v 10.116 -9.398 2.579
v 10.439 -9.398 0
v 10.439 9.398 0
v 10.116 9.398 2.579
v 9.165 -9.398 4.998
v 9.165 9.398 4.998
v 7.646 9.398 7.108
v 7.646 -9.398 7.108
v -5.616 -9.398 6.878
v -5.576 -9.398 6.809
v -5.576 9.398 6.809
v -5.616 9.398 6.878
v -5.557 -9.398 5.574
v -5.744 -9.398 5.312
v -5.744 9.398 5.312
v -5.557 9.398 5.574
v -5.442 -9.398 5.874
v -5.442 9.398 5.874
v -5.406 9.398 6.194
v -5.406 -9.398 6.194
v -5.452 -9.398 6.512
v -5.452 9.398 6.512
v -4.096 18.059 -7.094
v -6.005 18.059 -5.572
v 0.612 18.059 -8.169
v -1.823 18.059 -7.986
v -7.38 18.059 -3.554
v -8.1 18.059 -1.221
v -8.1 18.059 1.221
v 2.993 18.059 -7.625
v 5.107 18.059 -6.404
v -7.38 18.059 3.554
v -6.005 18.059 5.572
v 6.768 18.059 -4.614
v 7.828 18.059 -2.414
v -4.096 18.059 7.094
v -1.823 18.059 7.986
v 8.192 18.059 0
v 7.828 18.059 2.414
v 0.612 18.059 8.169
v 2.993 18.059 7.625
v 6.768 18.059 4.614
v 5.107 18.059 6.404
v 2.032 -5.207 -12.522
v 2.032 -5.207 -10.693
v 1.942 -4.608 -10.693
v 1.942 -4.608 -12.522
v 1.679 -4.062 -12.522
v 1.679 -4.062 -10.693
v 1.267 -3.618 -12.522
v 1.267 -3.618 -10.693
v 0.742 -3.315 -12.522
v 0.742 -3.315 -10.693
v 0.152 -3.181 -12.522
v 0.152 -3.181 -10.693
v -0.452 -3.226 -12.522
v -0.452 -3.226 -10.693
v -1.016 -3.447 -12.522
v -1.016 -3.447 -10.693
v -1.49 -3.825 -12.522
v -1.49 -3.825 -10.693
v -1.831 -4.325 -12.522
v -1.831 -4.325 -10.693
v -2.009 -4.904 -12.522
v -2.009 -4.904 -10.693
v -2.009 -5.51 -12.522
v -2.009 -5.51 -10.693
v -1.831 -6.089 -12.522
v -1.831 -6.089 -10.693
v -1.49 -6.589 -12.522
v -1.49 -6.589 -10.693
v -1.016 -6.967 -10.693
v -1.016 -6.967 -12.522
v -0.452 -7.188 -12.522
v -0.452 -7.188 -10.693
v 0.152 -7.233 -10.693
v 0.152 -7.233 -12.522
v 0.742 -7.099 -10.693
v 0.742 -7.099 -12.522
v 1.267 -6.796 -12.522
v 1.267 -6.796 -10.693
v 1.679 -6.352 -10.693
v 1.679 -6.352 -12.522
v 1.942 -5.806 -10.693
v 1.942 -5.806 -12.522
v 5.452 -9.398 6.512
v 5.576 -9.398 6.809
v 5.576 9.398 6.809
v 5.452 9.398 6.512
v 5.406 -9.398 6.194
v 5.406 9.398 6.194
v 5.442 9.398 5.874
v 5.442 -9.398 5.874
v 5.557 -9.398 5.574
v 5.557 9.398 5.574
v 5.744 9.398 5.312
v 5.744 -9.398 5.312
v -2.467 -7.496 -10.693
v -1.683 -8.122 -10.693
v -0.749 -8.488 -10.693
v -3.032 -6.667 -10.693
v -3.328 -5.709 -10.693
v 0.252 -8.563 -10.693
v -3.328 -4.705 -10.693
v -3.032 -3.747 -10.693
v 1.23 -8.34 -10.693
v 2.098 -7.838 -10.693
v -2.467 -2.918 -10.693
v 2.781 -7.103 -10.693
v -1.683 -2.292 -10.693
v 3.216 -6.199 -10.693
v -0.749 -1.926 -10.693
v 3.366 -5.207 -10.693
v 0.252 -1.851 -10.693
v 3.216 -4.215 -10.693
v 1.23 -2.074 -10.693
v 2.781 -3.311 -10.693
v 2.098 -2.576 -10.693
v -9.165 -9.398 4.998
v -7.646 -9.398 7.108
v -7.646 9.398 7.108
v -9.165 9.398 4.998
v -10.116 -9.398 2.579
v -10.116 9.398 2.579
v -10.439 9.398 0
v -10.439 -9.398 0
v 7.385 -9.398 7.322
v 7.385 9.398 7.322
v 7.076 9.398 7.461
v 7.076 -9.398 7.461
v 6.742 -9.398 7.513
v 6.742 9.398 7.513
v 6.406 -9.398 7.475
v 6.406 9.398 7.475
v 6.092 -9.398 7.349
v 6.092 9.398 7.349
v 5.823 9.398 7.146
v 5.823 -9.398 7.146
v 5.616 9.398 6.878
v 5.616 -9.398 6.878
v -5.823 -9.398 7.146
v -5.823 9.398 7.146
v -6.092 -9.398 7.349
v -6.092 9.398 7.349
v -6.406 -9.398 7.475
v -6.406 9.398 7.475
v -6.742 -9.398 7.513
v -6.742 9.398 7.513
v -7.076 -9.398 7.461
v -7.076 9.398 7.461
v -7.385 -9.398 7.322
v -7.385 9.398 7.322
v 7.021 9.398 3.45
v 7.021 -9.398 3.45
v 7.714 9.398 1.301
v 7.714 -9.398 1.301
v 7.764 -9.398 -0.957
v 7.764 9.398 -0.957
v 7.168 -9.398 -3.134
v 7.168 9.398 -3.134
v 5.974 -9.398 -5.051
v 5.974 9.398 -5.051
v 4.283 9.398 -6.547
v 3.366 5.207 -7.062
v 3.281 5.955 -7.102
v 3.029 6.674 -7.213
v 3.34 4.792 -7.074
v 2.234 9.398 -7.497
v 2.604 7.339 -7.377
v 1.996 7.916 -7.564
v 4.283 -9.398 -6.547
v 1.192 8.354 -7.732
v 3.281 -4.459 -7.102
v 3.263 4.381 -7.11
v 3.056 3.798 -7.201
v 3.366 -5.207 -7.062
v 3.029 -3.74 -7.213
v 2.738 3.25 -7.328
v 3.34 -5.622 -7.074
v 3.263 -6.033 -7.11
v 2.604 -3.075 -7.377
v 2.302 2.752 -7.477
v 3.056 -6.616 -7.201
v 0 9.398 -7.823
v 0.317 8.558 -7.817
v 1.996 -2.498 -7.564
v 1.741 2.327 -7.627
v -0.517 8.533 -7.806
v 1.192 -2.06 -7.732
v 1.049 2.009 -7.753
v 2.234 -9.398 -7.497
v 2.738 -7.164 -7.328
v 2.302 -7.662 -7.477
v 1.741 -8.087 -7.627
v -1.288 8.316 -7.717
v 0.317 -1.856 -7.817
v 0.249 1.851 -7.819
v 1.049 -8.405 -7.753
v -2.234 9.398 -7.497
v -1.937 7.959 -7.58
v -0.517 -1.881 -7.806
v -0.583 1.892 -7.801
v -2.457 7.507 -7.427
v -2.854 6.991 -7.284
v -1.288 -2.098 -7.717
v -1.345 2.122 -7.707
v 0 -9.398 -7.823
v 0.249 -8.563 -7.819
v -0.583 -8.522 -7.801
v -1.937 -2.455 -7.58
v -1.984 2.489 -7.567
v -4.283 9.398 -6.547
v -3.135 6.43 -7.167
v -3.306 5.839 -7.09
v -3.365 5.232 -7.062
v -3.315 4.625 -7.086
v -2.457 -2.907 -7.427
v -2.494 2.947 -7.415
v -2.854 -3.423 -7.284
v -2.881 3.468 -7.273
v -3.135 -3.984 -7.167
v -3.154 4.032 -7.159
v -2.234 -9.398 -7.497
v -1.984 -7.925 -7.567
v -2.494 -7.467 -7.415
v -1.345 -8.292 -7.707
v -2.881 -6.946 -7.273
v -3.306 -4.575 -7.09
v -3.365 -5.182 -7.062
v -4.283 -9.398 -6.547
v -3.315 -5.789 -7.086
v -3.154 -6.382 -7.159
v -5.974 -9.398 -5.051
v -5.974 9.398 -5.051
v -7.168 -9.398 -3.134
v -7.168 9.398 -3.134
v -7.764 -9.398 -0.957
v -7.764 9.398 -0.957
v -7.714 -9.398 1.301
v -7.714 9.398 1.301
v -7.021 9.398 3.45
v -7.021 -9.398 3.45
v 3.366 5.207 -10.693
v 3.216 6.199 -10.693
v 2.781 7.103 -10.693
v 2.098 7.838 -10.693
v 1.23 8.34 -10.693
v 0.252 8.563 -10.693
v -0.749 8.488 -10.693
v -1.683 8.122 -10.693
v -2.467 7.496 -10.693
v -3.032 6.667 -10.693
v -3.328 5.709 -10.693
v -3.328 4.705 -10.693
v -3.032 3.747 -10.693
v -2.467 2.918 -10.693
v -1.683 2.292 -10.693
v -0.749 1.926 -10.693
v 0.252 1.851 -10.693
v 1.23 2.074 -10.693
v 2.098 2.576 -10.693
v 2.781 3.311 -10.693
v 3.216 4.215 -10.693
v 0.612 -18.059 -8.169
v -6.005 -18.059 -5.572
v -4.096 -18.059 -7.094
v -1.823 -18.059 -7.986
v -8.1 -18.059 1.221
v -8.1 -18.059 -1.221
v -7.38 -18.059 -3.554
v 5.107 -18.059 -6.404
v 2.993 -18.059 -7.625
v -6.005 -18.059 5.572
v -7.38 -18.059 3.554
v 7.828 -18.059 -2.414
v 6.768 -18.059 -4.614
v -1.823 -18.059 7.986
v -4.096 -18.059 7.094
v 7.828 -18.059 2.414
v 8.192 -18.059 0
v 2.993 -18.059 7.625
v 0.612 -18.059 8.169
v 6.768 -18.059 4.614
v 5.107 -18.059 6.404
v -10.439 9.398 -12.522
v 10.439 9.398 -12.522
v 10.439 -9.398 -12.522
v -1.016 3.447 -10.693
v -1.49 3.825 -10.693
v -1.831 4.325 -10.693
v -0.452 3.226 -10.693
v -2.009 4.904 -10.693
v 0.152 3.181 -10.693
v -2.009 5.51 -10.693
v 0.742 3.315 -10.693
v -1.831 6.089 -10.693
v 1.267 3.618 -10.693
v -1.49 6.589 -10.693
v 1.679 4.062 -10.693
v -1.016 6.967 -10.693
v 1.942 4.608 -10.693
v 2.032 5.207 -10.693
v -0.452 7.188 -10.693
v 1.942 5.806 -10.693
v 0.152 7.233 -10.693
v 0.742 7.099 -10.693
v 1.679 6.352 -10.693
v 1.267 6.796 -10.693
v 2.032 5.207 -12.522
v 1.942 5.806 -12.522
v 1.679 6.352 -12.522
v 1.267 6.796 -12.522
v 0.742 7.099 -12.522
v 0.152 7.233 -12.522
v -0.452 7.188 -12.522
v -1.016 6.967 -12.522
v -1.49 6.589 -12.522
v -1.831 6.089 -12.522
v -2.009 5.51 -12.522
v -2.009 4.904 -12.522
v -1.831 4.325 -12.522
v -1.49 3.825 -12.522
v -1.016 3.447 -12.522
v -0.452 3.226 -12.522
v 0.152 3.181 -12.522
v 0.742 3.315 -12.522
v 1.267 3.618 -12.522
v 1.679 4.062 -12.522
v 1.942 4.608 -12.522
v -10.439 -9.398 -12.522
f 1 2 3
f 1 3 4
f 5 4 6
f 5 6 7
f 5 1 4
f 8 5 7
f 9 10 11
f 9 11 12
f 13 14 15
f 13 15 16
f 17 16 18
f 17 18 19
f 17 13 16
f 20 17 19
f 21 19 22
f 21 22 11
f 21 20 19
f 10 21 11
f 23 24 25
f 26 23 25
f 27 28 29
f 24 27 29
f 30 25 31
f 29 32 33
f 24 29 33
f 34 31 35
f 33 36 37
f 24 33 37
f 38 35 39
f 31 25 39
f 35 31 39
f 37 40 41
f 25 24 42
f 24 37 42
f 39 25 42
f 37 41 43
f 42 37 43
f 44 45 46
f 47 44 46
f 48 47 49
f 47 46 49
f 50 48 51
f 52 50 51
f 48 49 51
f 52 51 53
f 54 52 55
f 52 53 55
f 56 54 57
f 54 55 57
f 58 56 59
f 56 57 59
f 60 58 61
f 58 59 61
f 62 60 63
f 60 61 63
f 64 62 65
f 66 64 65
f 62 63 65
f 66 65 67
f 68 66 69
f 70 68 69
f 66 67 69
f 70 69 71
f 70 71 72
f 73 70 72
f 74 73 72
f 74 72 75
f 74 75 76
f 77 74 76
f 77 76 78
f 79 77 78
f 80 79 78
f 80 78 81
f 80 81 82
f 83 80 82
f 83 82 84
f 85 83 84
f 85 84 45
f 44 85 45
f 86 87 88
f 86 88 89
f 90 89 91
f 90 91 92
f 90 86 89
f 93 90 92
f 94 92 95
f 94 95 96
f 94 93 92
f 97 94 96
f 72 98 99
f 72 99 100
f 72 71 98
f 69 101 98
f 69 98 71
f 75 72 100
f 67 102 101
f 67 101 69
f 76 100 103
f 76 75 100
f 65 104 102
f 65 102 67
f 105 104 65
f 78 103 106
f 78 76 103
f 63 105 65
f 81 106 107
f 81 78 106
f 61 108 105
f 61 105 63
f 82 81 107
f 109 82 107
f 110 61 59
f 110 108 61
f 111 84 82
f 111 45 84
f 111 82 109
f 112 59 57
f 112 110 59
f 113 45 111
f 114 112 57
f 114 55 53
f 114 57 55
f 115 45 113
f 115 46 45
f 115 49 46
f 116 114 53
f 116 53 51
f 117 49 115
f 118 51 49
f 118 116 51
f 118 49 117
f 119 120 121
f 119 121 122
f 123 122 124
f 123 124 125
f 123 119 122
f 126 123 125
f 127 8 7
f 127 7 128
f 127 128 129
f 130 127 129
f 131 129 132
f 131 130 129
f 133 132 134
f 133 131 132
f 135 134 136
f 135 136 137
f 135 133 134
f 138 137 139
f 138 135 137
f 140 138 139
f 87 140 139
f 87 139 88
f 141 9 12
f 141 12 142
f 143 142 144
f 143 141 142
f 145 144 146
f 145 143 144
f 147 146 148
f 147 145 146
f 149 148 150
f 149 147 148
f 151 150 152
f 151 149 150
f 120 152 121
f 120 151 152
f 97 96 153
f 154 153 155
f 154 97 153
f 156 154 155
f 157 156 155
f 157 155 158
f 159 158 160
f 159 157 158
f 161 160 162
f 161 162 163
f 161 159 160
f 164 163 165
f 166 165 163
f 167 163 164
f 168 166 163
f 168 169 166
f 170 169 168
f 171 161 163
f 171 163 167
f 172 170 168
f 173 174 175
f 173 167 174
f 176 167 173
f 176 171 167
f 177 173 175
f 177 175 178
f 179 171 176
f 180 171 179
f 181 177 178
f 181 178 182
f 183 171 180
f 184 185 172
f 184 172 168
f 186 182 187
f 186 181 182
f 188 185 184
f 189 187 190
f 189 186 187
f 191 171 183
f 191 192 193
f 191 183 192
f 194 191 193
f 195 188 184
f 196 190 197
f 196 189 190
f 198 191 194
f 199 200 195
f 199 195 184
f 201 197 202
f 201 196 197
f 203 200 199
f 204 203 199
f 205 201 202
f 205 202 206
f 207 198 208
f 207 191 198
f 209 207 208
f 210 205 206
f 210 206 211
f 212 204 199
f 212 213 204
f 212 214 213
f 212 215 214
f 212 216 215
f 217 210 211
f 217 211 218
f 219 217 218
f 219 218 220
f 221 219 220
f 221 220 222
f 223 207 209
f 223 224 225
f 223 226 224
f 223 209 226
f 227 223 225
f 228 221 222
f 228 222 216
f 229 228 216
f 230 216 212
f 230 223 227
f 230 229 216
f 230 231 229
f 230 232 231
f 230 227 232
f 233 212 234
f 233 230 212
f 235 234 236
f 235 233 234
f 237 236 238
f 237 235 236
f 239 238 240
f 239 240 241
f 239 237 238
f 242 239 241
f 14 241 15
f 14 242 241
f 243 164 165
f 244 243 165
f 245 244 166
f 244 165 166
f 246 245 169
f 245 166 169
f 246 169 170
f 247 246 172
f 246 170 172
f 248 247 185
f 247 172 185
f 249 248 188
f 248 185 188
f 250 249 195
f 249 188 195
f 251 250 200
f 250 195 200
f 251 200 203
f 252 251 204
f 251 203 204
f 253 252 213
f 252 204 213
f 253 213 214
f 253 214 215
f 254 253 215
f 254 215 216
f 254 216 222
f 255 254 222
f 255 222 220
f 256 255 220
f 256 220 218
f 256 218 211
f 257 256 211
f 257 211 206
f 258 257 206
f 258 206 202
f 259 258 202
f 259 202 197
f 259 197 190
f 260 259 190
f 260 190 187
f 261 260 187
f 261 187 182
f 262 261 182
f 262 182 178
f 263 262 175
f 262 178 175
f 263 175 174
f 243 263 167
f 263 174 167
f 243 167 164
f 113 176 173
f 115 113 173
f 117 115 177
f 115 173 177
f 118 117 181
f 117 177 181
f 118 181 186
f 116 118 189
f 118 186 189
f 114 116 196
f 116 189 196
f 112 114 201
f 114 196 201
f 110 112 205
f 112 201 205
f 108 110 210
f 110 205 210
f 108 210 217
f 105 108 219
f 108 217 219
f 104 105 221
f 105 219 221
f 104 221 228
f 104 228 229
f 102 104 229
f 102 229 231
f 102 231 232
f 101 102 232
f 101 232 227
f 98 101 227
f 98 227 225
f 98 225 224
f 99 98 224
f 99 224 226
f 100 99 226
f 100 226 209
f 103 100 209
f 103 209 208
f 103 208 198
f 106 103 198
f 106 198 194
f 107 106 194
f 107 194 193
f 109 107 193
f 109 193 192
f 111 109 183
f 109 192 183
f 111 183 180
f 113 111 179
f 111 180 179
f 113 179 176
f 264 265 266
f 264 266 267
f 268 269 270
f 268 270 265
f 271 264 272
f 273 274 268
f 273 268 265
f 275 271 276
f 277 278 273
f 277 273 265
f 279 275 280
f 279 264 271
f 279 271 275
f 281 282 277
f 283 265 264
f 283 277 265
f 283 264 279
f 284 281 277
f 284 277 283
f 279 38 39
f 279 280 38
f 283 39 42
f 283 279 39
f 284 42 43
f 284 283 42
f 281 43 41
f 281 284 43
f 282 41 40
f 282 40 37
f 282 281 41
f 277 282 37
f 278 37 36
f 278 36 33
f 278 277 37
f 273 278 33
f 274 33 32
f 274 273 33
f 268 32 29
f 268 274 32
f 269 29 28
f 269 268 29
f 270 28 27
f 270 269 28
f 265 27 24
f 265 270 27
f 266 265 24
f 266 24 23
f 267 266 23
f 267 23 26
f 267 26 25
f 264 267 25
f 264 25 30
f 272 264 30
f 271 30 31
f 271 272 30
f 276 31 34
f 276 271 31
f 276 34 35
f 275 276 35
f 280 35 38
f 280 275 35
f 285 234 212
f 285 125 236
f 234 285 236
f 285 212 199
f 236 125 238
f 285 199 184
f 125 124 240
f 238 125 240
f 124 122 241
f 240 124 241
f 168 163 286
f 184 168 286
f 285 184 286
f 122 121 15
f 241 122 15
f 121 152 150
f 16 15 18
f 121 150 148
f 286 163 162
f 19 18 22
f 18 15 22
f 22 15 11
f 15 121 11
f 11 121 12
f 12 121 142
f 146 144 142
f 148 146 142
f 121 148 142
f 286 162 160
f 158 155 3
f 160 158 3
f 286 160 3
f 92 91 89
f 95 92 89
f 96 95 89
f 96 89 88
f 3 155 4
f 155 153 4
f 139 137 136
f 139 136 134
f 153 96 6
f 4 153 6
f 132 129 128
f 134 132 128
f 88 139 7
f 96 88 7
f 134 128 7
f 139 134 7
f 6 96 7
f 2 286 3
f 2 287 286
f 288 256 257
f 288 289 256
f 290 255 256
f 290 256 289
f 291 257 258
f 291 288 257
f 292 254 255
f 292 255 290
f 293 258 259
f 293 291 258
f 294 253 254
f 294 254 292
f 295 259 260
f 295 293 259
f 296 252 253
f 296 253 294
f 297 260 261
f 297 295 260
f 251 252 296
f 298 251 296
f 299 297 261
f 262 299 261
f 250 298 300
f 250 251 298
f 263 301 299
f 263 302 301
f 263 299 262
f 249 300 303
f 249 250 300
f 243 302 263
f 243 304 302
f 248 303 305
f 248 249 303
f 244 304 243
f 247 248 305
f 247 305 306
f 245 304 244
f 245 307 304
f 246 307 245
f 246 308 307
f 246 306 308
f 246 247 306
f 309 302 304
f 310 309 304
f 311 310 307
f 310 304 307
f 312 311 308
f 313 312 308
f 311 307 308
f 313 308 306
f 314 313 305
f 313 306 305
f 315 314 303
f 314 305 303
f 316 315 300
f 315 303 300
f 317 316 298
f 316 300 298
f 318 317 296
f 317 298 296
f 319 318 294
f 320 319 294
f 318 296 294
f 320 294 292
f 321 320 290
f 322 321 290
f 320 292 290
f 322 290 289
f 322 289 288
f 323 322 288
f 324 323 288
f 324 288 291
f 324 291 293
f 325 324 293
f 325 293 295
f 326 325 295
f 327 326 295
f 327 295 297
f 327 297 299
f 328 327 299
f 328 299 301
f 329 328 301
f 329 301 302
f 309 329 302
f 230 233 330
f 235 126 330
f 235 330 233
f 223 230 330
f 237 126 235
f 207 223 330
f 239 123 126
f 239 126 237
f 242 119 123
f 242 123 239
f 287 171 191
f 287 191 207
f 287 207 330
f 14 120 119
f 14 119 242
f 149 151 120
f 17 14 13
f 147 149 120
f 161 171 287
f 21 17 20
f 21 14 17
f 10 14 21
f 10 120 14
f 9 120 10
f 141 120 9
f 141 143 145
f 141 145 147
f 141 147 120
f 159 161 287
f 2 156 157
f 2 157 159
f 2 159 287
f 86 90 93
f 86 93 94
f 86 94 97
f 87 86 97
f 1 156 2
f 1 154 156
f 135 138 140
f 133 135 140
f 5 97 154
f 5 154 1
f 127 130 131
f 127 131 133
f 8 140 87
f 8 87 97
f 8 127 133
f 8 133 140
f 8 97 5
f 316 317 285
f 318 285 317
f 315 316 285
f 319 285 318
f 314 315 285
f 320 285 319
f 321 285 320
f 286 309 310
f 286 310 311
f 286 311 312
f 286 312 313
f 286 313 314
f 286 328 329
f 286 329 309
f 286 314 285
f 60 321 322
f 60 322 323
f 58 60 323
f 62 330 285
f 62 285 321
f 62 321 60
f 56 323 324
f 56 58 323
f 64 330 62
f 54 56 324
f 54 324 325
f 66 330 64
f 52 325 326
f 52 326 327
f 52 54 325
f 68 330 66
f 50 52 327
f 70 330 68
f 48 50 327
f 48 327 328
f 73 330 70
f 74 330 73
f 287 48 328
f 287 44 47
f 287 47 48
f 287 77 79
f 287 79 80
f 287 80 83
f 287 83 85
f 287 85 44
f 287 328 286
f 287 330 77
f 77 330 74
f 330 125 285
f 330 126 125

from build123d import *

# Parameters (mm, degrees)
F1_DEPTH = 9.398
F2_R     = 2.032
F3_DEPTH = 12.5232
F4_R     = 3.3655
F5_DEPTH = 10.6934
F6_R     = 8.1915
F7_DEPTH = 18.0594
F8_W     = 35.35
F8_H     = 35.35
F8_R     = 1.7145
F9_DEPTH = 0.6


with BuildPart() as f1:
    # F0 (on Front) → F1 (new body, symmetric)
    with BuildSketch(Plane.XZ):
        with BuildLine():
            Line((10.4394, -12.5222), (10.4394, 0))
            ThreePointArc((10.4394, 0), (9.716011, 3.818403), (7.646097, 7.107621))
            ThreePointArc((7.646097, 7.107621), (6.573141, 7.504896), (5.616063, 6.877947))
            Line((5.616063, 6.877947), (5.576187, 6.808879))
            ThreePointArc((5.576187, 6.808879), (5.413907, 6.032732), (5.743631, 5.311606))
            ThreePointArc((5.743631, 5.311606), (0, -7.8232), (-5.743631, 5.311606))
            ThreePointArc((-5.743631, 5.311606), (-5.413907, 6.032732), (-5.576187, 6.808879))
            Line((-5.576187, 6.808879), (-5.616063, 6.877947))
            ThreePointArc((-5.616063, 6.877947), (-6.573141, 7.504896), (-7.646097, 7.107621))
            ThreePointArc((-7.646097, 7.107621), (-9.716011, 3.818403), (-10.4394, 0))
            Line((-10.4394, 0), (-10.4394, -12.5222))
            Line((-10.4394, -12.5222), (10.4394, -12.5222))
        make_face()
    extrude(amount=F1_DEPTH, both=True)

    # F2 (on Top) → F3 (cut, through all)
    with BuildSketch(Plane.XY):
        with Locations((0, 5.207)):
            Circle(F2_R)
        with Locations((0, -5.207)):
            Circle(F2_R)
    extrude(amount=-F3_DEPTH, mode=Mode.SUBTRACT)

    # F4 (on Top) → F5 (cut)
    with BuildSketch(Plane.XY):
        with Locations((0, 5.207)):
            Circle(F4_R)
        with Locations((0, -5.207)):
            Circle(F4_R)
    extrude(amount=-F5_DEPTH, mode=Mode.SUBTRACT)


with BuildPart() as f7:
    # F6 (on Front) → F7 (new body, symmetric)
    with BuildSketch(Plane.XZ):
        Circle(F6_R)
    extrude(amount=F7_DEPTH, both=True)


with BuildPart() as f9:
    # F8 (on Front) → F9 (new body)
    with BuildSketch(Plane.XZ):
        with Locations((-14.5, 32.681693)):
            Rectangle(F8_W, F8_H)
        with Locations((-29, 18.181693)):
            Circle(F8_R, mode=Mode.SUBTRACT)
        with Locations((0, 18.181693)):
            Circle(F8_R, mode=Mode.SUBTRACT)
        with Locations((-29, 47.181693)):
            Circle(F8_R, mode=Mode.SUBTRACT)
        with Locations((0, 47.181693)):
            Circle(F8_R, mode=Mode.SUBTRACT)
    extrude(amount=F9_DEPTH)


solid = Compound([f1.part, f7.part])
